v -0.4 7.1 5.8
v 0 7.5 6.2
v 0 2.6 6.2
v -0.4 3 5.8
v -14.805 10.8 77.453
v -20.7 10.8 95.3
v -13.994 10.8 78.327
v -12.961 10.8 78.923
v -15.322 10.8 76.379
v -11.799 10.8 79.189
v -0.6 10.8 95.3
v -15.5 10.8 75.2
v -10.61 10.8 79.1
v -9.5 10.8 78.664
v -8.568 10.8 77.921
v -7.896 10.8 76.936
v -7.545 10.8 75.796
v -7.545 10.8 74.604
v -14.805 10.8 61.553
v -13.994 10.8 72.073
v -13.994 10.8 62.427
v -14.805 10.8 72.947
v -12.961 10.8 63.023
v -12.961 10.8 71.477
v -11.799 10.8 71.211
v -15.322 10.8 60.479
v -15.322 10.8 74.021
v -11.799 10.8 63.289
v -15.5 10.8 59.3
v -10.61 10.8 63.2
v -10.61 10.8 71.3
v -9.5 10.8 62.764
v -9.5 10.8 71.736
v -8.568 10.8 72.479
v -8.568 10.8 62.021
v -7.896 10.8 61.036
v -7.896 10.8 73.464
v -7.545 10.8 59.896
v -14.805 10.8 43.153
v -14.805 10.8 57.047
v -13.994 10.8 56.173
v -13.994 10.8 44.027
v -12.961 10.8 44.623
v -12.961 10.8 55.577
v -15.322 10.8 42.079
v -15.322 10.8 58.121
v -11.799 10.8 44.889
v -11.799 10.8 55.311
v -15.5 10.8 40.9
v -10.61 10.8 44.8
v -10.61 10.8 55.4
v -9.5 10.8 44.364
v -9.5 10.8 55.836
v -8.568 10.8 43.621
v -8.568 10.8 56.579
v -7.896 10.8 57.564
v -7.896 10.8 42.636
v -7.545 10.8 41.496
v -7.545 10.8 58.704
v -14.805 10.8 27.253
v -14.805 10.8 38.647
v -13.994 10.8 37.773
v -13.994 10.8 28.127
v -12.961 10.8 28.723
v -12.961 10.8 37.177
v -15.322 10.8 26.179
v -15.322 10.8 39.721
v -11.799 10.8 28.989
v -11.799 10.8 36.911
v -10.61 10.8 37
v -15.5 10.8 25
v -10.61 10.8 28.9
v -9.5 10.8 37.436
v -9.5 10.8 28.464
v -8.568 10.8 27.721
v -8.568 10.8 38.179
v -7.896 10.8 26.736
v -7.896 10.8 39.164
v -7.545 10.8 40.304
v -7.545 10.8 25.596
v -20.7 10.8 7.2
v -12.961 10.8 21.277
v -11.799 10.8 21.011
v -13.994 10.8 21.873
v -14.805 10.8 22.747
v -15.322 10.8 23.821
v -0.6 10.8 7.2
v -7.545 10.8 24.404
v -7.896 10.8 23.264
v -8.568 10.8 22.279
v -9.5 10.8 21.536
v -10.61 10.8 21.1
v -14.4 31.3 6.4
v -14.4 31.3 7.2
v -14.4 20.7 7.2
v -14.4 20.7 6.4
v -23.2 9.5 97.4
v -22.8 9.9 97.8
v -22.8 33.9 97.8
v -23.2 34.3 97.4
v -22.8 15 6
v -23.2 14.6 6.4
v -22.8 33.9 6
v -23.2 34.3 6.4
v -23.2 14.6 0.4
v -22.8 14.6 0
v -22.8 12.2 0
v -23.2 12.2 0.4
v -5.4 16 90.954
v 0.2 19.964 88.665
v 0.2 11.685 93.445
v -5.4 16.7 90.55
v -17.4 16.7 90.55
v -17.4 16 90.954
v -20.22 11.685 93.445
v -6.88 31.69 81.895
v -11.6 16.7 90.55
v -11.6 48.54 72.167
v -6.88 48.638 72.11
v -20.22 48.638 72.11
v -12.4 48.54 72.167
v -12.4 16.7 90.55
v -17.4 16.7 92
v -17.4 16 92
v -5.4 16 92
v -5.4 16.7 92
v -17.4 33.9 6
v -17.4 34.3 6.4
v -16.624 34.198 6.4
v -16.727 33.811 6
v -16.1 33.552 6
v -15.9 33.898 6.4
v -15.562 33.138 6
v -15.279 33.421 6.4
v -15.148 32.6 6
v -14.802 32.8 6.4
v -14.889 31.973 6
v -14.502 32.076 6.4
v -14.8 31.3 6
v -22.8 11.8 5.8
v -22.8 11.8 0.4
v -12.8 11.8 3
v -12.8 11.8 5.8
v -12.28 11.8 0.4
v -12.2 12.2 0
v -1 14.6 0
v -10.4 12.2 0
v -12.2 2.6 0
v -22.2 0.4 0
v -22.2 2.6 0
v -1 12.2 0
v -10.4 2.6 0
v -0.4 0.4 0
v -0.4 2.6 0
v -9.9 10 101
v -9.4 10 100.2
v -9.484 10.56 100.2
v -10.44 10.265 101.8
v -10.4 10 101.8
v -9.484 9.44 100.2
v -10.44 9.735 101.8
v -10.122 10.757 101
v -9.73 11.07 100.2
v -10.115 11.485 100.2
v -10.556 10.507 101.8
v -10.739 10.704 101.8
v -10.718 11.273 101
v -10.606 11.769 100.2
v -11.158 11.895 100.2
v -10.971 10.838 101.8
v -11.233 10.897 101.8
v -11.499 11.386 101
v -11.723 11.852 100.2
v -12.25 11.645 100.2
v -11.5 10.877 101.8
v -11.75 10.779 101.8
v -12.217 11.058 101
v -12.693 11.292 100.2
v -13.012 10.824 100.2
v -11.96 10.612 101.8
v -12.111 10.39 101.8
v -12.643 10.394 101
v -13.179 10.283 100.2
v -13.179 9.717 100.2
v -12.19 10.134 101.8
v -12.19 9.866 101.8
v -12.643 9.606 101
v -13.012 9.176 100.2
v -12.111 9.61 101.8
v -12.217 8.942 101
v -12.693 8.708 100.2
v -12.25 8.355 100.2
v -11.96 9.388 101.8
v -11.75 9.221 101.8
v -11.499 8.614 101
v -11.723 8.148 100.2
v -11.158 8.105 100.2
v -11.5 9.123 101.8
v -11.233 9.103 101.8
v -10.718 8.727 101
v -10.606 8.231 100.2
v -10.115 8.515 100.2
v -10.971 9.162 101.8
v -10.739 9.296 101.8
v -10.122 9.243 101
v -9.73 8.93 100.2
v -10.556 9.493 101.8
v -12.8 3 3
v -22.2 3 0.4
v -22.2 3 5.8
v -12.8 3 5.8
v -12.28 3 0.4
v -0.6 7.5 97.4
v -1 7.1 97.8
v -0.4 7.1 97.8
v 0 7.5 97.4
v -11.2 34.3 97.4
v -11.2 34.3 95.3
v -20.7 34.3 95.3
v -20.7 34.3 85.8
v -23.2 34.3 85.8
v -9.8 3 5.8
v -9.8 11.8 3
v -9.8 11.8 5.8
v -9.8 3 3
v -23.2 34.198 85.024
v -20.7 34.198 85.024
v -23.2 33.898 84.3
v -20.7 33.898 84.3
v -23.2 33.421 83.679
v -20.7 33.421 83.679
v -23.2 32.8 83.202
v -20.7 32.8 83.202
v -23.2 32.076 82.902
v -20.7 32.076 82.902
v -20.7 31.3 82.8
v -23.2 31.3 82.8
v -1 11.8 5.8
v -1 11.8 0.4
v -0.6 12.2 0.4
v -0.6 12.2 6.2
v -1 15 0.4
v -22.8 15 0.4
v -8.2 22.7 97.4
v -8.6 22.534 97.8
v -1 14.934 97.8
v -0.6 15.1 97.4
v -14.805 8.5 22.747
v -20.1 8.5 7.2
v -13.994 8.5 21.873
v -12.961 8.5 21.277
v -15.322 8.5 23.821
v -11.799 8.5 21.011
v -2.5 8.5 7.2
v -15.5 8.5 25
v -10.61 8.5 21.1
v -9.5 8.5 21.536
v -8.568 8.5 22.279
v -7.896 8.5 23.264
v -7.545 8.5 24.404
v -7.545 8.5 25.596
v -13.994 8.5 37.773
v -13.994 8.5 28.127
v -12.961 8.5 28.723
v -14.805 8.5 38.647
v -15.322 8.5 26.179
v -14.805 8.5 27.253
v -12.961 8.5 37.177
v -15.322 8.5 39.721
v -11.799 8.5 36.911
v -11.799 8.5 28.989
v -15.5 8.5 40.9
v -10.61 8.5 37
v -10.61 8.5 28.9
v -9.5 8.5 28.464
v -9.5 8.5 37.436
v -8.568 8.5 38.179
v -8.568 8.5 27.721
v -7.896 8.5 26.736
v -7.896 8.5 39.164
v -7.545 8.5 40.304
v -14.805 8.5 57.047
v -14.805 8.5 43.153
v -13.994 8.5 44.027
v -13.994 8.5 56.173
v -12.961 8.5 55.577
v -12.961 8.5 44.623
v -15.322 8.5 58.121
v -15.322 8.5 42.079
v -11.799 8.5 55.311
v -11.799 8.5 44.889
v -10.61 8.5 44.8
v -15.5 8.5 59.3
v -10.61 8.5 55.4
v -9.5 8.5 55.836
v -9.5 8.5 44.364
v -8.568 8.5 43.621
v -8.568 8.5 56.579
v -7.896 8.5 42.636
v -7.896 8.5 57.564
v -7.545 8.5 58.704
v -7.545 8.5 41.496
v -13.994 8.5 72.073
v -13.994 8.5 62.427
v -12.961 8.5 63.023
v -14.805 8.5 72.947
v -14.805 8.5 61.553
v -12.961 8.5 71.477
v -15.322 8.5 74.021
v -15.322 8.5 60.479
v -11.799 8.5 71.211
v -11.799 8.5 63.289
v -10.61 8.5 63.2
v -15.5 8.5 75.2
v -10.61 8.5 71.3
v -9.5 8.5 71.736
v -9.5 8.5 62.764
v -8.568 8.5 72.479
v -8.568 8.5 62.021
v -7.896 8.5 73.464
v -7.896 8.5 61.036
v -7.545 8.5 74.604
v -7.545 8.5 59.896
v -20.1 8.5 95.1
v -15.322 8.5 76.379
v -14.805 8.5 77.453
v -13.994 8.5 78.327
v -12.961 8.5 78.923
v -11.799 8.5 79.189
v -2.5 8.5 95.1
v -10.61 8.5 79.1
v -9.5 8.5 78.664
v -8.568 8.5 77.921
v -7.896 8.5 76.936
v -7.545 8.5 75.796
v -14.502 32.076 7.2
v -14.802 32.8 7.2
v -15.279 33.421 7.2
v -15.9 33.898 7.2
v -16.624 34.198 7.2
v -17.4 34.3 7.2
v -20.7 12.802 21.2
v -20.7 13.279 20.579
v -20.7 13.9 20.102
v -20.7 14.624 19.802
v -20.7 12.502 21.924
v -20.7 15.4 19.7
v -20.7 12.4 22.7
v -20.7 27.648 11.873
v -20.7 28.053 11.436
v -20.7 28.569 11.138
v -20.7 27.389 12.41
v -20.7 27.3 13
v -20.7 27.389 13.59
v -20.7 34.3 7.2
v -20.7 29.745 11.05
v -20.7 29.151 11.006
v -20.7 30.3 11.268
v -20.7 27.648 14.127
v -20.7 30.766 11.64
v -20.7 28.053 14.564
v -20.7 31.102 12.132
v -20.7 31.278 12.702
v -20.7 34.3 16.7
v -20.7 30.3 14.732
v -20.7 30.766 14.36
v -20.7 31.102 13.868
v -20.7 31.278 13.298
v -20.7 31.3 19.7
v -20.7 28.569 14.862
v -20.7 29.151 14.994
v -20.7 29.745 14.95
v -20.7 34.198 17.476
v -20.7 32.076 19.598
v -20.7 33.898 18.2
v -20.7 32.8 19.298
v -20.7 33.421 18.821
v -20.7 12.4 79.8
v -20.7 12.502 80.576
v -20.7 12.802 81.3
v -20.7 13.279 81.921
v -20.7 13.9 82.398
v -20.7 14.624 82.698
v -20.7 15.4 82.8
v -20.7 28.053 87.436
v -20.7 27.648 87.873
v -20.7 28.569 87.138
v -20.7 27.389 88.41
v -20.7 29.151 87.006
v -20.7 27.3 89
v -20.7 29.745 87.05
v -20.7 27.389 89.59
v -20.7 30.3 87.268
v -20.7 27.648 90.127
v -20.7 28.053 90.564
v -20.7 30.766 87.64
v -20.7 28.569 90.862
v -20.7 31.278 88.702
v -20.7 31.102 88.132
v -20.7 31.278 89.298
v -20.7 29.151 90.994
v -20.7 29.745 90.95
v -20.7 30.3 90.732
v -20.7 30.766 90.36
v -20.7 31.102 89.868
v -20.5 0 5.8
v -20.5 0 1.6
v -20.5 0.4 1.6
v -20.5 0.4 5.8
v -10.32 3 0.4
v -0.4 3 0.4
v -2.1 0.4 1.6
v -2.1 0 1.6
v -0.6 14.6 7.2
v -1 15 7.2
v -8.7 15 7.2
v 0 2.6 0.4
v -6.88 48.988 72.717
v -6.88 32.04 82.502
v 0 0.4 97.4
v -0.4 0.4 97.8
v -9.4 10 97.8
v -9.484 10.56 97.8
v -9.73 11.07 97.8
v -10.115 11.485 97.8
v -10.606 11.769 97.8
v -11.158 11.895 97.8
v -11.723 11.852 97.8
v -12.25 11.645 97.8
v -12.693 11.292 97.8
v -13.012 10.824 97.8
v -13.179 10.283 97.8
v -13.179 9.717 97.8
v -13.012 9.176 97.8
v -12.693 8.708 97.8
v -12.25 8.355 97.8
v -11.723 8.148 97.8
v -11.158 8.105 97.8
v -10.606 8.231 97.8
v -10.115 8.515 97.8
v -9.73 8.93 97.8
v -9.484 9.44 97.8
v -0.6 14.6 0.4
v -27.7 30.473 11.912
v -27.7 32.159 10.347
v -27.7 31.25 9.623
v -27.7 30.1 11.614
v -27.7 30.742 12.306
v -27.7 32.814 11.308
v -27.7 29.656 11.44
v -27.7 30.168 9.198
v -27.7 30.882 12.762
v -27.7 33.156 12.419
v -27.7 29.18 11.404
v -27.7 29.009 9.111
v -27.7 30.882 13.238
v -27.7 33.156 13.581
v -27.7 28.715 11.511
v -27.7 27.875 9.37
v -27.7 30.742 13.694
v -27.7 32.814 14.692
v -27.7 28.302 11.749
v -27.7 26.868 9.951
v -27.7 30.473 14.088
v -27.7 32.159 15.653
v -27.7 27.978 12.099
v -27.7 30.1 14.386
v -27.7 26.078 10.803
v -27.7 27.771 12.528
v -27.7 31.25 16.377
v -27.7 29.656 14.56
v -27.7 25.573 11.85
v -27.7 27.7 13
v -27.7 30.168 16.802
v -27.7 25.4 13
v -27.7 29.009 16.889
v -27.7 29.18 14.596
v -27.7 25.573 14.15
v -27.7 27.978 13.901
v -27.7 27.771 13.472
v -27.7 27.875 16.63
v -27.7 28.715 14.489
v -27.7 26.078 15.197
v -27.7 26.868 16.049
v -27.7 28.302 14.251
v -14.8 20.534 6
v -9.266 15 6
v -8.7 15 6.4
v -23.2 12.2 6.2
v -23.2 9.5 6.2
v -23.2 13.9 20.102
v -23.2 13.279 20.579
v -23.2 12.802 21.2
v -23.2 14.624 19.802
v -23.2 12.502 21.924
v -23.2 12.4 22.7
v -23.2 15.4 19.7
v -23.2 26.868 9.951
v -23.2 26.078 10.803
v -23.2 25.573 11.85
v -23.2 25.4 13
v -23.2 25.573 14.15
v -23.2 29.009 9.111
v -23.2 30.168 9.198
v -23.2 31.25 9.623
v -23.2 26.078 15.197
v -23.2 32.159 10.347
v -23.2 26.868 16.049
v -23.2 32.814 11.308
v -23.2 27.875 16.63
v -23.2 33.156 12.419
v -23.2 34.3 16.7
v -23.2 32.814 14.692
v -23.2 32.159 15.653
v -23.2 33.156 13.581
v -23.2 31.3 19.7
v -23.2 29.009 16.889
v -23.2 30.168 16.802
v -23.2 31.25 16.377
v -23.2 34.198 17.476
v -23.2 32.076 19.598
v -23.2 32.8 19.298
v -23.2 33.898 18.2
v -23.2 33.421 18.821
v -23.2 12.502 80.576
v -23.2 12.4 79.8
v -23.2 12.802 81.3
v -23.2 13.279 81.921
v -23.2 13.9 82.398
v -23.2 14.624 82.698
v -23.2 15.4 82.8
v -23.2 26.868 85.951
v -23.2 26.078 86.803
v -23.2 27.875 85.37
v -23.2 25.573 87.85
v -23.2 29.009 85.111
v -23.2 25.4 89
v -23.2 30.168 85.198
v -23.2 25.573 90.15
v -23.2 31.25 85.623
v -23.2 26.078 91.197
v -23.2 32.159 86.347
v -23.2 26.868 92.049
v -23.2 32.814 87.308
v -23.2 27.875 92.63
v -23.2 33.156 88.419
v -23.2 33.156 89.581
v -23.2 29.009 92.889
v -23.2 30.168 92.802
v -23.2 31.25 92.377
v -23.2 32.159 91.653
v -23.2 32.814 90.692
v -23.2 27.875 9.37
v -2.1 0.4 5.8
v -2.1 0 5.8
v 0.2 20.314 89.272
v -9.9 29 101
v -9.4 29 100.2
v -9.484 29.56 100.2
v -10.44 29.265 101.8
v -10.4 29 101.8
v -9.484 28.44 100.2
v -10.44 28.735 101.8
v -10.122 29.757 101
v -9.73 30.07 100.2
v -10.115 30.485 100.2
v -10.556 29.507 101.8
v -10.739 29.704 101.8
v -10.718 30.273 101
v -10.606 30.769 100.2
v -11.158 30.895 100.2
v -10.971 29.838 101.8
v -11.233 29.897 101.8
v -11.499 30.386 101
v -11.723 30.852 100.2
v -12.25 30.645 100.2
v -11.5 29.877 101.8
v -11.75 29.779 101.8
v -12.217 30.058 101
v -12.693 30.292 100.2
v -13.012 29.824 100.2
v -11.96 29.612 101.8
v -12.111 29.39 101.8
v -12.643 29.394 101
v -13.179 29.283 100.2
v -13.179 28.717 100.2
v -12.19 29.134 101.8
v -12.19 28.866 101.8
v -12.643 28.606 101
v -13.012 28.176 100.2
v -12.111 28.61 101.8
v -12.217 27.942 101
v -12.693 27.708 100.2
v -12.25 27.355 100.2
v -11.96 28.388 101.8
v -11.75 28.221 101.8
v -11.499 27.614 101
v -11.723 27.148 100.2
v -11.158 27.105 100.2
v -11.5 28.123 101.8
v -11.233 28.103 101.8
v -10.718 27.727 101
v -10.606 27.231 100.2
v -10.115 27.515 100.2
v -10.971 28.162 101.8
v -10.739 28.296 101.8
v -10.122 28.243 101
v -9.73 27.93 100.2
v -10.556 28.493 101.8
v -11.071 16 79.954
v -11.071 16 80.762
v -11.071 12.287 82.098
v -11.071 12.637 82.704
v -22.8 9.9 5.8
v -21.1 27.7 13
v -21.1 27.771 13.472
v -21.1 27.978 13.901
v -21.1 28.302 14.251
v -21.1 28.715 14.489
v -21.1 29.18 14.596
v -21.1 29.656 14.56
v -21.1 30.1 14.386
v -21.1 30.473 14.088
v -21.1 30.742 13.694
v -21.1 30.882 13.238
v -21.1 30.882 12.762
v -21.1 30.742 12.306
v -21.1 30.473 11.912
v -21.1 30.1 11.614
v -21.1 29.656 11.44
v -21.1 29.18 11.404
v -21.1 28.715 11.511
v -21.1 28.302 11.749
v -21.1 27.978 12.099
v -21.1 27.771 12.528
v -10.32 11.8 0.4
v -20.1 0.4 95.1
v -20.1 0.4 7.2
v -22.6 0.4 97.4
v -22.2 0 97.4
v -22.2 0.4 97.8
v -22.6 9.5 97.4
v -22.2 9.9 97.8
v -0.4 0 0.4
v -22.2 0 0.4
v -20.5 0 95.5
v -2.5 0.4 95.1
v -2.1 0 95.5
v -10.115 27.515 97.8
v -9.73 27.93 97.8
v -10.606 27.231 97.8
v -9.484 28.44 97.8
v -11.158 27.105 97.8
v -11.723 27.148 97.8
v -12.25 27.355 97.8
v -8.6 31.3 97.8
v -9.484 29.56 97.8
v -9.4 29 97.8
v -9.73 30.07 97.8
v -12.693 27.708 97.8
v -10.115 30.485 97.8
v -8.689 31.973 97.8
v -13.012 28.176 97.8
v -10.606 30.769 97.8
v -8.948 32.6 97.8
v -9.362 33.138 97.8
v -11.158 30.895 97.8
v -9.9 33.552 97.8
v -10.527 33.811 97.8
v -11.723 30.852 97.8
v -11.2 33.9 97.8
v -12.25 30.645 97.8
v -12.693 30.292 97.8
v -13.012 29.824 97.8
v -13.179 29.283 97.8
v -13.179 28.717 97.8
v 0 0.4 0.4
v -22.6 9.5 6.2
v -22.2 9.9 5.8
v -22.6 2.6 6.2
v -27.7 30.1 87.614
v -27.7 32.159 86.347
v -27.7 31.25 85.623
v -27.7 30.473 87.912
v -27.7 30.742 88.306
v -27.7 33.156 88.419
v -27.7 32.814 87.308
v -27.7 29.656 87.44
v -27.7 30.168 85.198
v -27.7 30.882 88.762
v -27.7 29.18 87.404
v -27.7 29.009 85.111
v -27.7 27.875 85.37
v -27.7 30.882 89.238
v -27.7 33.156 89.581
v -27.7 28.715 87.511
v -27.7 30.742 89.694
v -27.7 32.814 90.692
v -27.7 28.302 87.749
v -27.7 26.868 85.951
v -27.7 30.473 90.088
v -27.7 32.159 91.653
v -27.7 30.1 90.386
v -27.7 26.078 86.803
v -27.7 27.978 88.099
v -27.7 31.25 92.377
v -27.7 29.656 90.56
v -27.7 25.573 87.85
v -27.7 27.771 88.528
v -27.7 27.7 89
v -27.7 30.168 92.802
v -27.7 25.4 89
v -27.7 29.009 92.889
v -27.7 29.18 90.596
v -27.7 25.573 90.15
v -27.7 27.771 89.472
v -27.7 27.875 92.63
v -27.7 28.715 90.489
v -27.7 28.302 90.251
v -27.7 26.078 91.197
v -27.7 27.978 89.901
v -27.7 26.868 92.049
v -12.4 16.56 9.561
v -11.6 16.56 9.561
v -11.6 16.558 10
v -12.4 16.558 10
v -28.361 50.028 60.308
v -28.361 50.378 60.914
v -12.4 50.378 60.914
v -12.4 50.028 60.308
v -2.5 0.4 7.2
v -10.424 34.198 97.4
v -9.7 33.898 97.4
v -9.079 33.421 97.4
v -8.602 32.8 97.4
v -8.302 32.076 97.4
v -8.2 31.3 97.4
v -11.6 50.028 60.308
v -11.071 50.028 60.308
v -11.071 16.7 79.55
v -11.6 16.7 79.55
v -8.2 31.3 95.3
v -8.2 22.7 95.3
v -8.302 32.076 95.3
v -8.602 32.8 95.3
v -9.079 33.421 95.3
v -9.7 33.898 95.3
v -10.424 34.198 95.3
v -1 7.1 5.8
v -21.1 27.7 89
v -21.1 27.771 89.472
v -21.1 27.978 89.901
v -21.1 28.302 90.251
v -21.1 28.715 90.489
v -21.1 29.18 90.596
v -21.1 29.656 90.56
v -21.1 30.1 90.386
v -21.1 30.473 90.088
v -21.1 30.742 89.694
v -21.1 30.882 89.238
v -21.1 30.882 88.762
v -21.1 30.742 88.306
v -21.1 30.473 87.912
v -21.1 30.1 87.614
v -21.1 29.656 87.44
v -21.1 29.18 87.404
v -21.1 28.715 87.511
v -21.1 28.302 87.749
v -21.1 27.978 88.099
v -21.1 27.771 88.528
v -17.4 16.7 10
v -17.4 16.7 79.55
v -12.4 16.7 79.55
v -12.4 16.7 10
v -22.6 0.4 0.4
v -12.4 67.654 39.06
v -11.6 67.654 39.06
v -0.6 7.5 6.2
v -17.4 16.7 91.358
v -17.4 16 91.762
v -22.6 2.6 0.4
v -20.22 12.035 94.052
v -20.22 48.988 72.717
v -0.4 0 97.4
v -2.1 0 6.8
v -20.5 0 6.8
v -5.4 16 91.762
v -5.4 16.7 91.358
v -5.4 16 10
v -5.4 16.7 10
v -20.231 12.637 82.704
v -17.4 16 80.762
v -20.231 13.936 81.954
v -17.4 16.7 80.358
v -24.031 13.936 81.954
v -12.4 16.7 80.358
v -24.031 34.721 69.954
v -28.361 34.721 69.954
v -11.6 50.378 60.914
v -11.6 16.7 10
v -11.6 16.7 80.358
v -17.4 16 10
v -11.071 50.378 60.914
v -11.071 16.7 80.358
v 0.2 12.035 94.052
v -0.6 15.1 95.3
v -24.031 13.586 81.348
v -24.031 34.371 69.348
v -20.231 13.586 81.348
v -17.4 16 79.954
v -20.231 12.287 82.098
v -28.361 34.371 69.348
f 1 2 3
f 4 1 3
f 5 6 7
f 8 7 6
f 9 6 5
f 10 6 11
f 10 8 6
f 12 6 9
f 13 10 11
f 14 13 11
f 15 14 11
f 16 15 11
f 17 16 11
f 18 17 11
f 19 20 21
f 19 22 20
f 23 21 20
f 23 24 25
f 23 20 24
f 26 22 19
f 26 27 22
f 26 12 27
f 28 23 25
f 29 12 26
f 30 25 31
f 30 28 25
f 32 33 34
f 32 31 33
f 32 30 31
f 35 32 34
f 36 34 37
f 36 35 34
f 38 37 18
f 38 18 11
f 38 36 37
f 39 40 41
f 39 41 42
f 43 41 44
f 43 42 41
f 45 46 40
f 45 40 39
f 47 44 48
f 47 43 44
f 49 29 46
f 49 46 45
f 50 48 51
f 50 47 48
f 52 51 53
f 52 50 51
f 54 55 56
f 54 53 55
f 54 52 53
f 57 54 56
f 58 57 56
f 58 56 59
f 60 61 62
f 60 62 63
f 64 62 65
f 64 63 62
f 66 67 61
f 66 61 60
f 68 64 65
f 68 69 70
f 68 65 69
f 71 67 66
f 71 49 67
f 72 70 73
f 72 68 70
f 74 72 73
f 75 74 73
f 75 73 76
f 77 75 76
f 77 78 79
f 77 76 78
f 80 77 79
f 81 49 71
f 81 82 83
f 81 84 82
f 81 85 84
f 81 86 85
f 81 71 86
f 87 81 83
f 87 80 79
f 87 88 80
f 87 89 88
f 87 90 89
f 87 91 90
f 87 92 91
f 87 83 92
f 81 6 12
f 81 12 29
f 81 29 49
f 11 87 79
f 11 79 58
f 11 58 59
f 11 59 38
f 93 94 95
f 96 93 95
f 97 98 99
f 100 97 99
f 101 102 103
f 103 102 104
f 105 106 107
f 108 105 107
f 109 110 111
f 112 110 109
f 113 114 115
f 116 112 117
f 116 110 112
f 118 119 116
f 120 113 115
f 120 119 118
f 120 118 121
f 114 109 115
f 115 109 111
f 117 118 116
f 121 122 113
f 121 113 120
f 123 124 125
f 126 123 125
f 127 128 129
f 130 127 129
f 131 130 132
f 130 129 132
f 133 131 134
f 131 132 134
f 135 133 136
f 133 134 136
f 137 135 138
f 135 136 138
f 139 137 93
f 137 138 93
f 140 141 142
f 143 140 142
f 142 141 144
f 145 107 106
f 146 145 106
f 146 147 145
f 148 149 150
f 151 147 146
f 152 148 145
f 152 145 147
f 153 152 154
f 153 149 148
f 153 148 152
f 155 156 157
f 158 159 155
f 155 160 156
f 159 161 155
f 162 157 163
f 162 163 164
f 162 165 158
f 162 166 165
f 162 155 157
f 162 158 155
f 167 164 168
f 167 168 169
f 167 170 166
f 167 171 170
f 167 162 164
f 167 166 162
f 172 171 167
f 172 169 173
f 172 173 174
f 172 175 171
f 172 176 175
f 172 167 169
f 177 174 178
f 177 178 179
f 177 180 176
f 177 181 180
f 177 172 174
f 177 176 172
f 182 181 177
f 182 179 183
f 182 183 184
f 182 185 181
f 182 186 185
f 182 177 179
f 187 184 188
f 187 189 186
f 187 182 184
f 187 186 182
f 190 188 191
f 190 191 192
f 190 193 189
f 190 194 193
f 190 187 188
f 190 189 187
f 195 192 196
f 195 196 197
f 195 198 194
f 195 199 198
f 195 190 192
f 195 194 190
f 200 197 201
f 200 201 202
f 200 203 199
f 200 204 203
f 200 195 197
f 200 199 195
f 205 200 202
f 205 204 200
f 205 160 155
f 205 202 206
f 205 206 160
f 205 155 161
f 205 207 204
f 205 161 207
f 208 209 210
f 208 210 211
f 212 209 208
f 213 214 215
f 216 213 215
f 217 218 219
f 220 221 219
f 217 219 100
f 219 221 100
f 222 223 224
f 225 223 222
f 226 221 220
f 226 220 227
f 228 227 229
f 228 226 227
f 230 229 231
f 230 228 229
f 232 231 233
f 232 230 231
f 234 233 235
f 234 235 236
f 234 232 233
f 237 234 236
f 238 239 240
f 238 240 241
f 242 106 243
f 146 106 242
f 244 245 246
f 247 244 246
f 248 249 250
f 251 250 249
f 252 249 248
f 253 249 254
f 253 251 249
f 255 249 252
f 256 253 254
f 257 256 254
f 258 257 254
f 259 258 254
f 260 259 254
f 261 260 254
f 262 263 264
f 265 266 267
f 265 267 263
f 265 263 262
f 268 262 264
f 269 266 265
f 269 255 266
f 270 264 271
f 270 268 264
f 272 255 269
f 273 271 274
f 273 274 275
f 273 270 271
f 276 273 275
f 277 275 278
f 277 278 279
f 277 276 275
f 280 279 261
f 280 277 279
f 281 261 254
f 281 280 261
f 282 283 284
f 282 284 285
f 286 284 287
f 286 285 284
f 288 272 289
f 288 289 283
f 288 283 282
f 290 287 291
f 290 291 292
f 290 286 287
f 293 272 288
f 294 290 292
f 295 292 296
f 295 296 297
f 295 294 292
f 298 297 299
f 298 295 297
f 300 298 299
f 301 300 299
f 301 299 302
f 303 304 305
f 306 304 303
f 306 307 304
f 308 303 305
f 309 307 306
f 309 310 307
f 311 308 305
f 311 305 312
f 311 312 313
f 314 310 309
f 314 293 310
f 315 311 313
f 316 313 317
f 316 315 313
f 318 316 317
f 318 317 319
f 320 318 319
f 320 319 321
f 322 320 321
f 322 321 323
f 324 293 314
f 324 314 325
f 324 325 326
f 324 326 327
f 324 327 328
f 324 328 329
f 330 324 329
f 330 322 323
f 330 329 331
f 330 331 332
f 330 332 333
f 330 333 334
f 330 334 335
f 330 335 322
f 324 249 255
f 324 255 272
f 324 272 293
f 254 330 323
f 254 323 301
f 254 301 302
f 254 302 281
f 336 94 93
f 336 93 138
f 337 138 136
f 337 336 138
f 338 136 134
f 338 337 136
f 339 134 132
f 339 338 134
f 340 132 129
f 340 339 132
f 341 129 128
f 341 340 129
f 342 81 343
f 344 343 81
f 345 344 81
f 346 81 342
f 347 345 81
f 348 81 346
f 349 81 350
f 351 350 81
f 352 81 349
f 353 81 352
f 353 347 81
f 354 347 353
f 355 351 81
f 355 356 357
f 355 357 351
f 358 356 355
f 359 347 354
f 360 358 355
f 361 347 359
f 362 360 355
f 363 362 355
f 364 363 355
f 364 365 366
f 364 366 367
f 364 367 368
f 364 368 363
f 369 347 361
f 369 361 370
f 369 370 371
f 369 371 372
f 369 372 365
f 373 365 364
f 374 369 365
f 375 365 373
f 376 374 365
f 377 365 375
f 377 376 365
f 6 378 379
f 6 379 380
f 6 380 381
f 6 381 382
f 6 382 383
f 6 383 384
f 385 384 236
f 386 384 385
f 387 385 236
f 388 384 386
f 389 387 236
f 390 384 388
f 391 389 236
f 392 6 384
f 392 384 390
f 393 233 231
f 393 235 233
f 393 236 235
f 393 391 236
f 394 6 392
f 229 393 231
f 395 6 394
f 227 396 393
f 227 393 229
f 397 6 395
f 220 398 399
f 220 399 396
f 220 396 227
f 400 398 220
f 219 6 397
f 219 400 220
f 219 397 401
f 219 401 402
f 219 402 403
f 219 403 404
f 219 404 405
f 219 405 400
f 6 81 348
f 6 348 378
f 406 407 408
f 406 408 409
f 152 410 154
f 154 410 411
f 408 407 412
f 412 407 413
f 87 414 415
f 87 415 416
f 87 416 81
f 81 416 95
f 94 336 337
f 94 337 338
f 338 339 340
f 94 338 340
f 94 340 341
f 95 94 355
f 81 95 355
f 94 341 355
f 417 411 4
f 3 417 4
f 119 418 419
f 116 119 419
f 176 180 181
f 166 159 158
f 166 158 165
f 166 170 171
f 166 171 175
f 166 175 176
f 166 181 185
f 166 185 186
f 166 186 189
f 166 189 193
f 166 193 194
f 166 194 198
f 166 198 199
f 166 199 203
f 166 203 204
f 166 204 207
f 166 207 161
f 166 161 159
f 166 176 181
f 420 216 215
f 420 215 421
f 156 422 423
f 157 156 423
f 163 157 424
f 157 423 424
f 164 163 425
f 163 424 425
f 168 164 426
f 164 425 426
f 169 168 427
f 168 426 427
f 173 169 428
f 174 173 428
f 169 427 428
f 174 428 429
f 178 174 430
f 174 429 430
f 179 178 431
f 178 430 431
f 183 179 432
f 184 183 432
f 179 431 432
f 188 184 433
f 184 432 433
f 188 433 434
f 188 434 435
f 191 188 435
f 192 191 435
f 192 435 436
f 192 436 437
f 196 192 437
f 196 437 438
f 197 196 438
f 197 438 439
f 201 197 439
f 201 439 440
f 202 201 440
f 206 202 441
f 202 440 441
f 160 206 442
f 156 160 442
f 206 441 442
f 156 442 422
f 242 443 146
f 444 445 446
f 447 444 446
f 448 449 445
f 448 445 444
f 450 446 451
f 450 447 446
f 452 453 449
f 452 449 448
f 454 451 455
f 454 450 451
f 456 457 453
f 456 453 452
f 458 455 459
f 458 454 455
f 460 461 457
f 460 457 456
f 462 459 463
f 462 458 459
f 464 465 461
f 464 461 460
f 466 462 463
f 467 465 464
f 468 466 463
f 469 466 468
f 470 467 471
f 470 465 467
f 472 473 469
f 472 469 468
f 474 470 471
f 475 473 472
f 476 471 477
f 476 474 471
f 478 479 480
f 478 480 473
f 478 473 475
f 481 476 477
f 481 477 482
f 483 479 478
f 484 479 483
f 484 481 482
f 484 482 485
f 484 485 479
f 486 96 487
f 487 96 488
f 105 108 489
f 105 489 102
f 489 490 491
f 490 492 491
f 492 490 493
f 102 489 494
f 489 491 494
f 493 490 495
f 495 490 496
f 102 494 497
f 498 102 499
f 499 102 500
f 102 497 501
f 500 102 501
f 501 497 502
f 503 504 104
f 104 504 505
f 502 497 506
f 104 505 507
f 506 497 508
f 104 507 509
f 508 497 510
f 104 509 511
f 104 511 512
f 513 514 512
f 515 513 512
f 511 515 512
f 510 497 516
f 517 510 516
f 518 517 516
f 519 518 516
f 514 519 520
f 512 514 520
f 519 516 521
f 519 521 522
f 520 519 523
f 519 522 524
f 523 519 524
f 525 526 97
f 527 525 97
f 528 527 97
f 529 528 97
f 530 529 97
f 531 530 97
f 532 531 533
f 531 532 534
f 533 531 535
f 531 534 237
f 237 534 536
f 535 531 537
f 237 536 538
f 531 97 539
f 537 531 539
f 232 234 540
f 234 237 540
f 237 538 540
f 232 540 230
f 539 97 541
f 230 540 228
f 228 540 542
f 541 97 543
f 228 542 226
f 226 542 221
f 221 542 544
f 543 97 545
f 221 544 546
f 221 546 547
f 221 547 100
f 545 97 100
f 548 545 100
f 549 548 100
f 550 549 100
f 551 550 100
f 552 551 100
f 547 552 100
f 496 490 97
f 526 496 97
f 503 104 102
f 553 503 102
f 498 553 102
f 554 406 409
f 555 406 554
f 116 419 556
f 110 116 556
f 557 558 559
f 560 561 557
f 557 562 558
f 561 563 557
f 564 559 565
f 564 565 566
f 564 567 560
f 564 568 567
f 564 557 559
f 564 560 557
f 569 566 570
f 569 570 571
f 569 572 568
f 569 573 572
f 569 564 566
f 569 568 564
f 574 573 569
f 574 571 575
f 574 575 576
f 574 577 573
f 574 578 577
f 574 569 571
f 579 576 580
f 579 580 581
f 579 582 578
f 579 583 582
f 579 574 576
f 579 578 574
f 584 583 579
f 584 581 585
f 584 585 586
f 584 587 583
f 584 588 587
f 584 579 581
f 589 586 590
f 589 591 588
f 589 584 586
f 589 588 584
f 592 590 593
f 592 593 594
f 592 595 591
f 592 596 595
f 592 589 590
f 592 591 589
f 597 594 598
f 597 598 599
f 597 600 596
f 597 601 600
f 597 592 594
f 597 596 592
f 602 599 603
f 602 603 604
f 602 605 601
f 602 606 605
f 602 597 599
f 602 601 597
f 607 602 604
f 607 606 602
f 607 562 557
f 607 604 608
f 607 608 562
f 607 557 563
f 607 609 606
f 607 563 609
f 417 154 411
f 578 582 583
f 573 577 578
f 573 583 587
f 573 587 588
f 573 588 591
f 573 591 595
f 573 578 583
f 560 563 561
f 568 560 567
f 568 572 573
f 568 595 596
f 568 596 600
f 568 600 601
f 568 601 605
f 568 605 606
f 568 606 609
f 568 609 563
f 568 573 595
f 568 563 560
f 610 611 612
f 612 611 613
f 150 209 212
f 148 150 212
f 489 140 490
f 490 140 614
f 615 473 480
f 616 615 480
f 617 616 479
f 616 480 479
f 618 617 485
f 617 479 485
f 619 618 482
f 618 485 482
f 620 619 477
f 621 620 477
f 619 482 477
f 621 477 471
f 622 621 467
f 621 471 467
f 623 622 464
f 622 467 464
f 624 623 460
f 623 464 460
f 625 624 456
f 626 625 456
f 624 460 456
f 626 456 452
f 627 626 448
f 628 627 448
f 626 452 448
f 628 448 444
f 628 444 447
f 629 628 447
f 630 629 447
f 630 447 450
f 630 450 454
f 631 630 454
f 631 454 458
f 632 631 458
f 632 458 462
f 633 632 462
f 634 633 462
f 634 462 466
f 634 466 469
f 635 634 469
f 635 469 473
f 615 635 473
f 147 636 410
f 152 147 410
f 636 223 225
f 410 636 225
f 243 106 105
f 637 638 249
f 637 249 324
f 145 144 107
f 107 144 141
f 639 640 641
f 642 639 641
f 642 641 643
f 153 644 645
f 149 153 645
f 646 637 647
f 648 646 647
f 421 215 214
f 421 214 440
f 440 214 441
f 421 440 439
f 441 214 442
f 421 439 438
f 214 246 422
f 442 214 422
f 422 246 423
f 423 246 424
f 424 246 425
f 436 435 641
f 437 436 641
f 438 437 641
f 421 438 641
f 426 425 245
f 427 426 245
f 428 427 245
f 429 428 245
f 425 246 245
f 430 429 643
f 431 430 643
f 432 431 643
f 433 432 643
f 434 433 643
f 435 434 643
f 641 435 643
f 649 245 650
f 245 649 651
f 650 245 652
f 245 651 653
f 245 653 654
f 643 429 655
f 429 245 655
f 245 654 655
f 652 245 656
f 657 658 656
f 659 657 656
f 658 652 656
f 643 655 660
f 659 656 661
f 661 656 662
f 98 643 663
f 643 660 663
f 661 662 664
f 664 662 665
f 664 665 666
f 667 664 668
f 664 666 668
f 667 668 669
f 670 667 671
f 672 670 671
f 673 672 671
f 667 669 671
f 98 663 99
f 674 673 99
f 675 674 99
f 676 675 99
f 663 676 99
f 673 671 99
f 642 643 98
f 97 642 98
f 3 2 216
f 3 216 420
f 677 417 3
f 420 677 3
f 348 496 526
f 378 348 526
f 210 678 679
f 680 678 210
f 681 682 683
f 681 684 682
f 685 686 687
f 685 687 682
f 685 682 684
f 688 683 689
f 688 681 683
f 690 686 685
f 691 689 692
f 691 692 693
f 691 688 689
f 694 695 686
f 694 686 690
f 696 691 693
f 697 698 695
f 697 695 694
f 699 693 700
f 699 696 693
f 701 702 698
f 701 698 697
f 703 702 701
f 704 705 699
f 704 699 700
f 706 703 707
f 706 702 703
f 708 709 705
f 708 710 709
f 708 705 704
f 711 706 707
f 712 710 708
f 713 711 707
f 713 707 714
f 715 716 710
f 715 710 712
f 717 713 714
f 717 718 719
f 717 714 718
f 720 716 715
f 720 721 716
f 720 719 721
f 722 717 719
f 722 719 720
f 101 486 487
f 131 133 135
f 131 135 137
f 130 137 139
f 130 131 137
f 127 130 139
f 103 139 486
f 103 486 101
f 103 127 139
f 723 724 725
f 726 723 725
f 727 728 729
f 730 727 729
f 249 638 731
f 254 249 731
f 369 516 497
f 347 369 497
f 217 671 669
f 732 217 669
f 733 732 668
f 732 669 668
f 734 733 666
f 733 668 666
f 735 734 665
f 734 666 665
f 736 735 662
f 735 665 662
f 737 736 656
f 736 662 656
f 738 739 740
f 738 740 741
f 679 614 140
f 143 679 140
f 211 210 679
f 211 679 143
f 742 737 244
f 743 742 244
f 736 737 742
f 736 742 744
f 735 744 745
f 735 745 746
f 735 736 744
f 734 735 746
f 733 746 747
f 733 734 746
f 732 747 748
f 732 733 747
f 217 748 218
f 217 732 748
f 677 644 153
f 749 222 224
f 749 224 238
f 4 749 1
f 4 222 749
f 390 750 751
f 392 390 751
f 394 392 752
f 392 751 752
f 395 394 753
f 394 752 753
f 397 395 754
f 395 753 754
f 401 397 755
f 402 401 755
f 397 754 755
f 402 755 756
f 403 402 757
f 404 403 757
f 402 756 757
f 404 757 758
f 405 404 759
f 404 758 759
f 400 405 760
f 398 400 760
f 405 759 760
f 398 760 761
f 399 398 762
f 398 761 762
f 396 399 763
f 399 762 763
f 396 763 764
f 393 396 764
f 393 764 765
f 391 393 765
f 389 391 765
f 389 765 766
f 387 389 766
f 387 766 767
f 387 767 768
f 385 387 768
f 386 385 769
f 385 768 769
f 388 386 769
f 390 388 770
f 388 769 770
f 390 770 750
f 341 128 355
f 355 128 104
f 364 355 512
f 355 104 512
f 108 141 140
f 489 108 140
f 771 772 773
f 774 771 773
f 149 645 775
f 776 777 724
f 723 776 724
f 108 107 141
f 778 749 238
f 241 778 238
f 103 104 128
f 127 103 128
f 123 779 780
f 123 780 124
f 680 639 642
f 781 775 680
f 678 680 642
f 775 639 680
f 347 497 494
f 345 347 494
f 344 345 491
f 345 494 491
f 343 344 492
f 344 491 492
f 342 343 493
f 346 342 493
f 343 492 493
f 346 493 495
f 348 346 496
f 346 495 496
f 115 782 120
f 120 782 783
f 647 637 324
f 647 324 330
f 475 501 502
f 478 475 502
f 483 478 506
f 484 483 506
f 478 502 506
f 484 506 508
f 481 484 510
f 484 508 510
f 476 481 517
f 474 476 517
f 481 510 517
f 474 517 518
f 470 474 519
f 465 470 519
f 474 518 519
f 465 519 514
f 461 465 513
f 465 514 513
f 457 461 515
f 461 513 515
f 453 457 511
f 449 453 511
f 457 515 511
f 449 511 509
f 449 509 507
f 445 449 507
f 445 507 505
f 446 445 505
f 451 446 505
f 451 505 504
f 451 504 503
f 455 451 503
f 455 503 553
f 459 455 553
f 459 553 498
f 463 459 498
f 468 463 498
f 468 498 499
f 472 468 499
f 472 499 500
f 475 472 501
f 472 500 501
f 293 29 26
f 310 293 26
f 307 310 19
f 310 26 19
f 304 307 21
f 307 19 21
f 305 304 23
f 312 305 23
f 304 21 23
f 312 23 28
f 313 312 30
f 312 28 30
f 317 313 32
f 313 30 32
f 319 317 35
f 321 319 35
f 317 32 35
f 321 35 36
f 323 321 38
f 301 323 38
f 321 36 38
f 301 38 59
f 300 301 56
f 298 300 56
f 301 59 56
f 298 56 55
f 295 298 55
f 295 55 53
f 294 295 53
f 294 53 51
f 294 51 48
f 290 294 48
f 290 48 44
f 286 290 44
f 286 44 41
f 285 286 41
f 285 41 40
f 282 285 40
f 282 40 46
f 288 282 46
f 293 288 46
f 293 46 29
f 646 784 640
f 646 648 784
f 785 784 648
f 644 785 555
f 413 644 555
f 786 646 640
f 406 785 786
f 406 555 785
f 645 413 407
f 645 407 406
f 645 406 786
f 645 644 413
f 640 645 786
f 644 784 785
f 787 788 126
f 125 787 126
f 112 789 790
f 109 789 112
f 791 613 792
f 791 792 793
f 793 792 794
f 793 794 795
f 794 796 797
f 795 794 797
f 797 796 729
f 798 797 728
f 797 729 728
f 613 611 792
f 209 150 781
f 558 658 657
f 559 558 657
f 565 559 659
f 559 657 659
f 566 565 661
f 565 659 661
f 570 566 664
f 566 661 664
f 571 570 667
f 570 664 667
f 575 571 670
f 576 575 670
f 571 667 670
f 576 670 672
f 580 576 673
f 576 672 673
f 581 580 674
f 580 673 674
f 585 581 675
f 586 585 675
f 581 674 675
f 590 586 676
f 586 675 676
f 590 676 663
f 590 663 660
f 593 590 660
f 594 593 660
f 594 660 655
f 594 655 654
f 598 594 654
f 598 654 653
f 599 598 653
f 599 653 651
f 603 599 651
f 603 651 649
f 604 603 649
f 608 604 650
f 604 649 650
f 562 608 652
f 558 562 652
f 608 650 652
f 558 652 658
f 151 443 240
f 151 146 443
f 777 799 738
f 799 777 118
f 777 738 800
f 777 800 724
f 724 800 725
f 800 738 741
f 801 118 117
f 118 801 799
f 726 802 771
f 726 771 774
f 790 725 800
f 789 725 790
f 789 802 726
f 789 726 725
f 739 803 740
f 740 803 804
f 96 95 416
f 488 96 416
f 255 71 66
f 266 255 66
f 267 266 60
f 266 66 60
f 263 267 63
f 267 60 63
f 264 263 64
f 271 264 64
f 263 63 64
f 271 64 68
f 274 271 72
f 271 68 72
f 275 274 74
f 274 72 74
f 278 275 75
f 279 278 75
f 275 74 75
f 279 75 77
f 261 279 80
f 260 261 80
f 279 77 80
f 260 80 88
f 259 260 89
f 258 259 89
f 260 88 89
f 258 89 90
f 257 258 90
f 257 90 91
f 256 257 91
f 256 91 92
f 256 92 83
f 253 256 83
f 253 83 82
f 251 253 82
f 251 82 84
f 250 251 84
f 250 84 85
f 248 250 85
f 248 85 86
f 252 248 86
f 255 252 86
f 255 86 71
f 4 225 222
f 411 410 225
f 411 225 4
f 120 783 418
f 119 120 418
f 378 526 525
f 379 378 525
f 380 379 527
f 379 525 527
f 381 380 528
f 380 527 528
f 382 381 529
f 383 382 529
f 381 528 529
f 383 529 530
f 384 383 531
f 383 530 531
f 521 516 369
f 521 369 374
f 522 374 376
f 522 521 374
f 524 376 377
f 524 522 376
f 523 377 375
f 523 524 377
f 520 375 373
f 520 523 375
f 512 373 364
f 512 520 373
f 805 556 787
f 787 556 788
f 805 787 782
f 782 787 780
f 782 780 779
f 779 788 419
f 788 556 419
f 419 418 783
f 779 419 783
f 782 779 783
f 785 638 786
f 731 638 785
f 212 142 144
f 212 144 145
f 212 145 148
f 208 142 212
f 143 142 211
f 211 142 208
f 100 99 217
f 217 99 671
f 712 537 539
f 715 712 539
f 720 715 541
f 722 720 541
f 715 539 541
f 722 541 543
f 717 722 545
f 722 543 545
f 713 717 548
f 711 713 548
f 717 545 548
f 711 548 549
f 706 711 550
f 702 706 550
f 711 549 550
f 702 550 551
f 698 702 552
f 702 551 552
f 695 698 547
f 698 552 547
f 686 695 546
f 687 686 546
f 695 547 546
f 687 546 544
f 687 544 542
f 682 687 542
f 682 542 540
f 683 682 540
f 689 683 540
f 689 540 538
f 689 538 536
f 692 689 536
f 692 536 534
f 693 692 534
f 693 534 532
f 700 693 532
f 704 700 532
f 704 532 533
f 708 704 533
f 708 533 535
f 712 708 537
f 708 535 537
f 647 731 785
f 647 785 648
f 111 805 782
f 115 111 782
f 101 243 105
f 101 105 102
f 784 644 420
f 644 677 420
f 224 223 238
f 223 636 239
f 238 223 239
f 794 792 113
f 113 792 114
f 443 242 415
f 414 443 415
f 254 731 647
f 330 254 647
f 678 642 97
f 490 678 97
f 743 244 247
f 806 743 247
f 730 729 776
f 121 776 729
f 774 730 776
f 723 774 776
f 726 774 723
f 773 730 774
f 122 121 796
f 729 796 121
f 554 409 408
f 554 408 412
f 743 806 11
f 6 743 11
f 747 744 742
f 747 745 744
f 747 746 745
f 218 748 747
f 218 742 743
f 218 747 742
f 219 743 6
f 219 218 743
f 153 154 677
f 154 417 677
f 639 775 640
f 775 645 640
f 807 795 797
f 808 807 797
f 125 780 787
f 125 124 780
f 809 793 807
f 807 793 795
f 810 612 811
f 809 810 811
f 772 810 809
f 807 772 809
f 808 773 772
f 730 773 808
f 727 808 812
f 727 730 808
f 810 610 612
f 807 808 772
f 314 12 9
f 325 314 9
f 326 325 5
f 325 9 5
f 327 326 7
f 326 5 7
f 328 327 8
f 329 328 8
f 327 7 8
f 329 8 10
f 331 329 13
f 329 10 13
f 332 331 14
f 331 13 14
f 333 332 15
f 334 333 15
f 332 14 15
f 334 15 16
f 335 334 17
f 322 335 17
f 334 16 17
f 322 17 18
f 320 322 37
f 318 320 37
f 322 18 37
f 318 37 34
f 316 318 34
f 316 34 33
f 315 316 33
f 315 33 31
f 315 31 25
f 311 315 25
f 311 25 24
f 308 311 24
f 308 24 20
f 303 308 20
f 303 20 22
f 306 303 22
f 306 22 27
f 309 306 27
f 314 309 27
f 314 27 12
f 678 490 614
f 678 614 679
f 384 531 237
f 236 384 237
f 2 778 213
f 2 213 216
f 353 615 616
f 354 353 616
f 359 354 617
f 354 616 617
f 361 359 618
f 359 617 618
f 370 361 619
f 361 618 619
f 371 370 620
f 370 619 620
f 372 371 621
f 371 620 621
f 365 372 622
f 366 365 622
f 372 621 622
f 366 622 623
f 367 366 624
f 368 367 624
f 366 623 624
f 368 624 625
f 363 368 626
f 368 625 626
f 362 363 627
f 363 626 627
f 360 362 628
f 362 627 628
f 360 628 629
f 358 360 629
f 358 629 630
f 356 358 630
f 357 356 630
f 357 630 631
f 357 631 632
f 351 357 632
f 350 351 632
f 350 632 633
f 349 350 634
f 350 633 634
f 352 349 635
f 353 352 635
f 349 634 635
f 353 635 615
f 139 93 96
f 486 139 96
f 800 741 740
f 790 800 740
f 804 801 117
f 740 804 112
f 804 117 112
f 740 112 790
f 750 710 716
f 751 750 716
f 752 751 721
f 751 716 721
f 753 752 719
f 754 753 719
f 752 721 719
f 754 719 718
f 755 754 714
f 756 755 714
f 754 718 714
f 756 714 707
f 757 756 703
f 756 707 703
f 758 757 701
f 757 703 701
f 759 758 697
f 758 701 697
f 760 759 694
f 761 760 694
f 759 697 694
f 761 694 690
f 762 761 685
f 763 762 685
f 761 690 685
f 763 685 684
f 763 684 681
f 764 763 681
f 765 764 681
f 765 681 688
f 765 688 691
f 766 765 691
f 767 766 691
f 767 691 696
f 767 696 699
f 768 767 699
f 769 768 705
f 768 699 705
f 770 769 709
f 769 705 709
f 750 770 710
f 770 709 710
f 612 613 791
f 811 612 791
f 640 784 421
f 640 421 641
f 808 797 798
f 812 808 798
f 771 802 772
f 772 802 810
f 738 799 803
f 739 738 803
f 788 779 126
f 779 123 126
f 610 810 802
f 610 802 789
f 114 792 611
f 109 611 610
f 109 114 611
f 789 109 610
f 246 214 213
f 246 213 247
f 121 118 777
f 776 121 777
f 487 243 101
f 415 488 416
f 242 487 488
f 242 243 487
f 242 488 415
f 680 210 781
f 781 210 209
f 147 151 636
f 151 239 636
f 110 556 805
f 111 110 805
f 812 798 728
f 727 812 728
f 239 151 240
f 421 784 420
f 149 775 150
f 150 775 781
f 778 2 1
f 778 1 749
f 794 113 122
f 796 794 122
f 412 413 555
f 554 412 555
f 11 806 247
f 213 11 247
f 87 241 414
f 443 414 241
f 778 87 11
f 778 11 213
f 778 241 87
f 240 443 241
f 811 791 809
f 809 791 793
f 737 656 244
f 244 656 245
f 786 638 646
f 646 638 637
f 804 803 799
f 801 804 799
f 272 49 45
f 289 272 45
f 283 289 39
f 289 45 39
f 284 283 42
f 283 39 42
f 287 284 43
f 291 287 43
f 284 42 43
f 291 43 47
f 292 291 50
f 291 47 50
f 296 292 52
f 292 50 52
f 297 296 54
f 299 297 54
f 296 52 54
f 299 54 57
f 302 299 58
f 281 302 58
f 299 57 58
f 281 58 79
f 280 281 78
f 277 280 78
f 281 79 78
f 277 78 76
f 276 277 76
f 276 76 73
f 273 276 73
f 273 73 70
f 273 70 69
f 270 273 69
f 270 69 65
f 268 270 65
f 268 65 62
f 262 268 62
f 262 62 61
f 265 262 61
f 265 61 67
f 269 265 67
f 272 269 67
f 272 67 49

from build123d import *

# Parameters (mm, degrees)
PAD_DEPTH          = 97.8
PAD001_DEPTH       = 2.5
SKETCH002_W        = 22.6
SKETCH002_H        = 4.2
PAD002_DEPTH       = 7.2
PAD003_DEPTH       = 1.2
PAD004_DEPTH       = 2.5
SKETCH005_W        = 10.4
SKETCH005_H        = 8.8
SKETCH005_W_2      = 9.8
POCKET_DEPTH       = 5.8
CHAMFER_SIZE2      = 3
CHAMFER_SIZE       = 0.6
CHAMFER001_SIZE2   = 3
CHAMFER001_SIZE    = 0.6
SKETCH006_R        = 3.9
PAD005_DEPTH       = 4.5
SKETCH007_R        = 1.6
POCKET001_DEPTH    = 5
SKETCH008_R        = 1.9
PAD006_DEPTH       = 4
CHAMFER002_1_SIZE2 = 1
CHAMFER002_1_SIZE  = 1.6
CHAMFER002_2_SIZE2 = 1
CHAMFER002_2_SIZE  = 1.6
SKETCH009_W        = 18.4
SKETCH009_H        = 4.2
POCKET002_DEPTH    = 0.4
SKETCH010_W        = 17.6
SKETCH010_H        = 87.9
POCKET003_DEPTH    = 8.5
CHAMFER003_SIZE    = 0.4
CHAMFER004_SIZE    = 0.4
CHAMFER005_SIZE    = 0.4
SKETCH011_R        = 4
POCKET004_DEPTH    = 5
SKETCH012_W        = 12
SKETCH012_H        = 82
PAD007_DEPTH       = 0.7
PAD008_DEPTH       = 0.7
PAD009_DEPTH       = 0.7
PAD010_DEPTH       = 0.4


with BuildPart() as body:
    # Sketch → Pad (new body)
    with BuildSketch(Plane.XY):
        Polygon((-22.6, 0), (-22.6, 9.5), (-23.2, 9.5), (-23.2, 10.8), (-0.6, 10.8), (-0.6, 7.5), (0, 7.5), (0, 0), align=None)
    extrude(amount=PAD_DEPTH)

    # Sketch001 (on Face10 of Pad) → Pad001 (join)
    with BuildSketch(Plane.XY.offset(97.8)):
        with BuildLine():
            Line((-23.2, 10.8), (-23.2, 34.3))
            Line((-23.2, 34.3), (-11.2, 34.3))
            ThreePointArc((-8.2, 31.3), (-9.07868, 33.42132), (-11.2, 34.3))
            Line((-8.2, 31.3), (-8.2, 22.7))
            Line((-8.2, 22.7), (-0.6, 15.1))
            Line((-0.6, 15.1), (-0.6, 10.8))
            Line((-0.6, 10.8), (-23.2, 10.8))
        make_face()
    extrude(amount=-PAD001_DEPTH)

    # Sketch002 (on Face4 of Pad001) → Pad002 (join)
    with BuildSketch(Plane(origin=(0, 0, 0), x_dir=(1, 0, 0), z_dir=(0, 0, -1))):
        with Locations((-11.9, -12.9)):
            Rectangle(SKETCH002_W, SKETCH002_H)
    extrude(amount=-PAD002_DEPTH)

    # Sketch003 (on Face22 of Pad002) → Pad003 (join)
    with BuildSketch(Plane.XY.offset(7.2)):
        with BuildLine():
            Line((-23.2, 15), (-23.2, 34.3))
            Line((-23.2, 34.3), (-17.4, 34.3))
            ThreePointArc((-14.4, 31.3), (-15.27868, 33.42132), (-17.4, 34.3))
            Line((-14.4, 31.3), (-14.4, 20.7))
            Line((-14.4, 20.7), (-8.7, 15))
            Line((-8.7, 15), (-23.2, 15))
        make_face()
    extrude(amount=-PAD003_DEPTH)

    # Sketch004 (on Face7 of Pad003) → Pad004 (join)
    with BuildSketch(Plane(origin=(-23.2, 0, 0), x_dir=(0, -1, 0), z_dir=(-1, 0, 0))):
        with BuildLine():
            Line((-34.3, 7.2), (-34.3, 16.7))
            ThreePointArc((-31.3, 19.7), (-33.42132, 18.82132), (-34.3, 16.7))
            Line((-31.3, 19.7), (-15.4, 19.7))
            ThreePointArc((-15.4, 19.7), (-13.27868, 20.57868), (-12.4, 22.7))
            Line((-12.4, 22.7), (-12.4, 79.8))
            ThreePointArc((-12.4, 79.8), (-13.27868, 81.92132), (-15.4, 82.8))
            Line((-15.4, 82.8), (-31.3, 82.8))
            ThreePointArc((-34.3, 85.8), (-33.42132, 83.67868), (-31.3, 82.8))
            Line((-34.3, 85.8), (-34.3, 95.3))
            Line((-34.3, 95.3), (-10.8, 95.3))
            Line((-10.8, 95.3), (-10.8, 7.2))
            Line((-10.8, 7.2), (-34.3, 7.2))
        make_face()
    extrude(amount=-PAD004_DEPTH)

    # Sketch005 (on Face4 of Pad004) → Pocket (cut)
    with BuildSketch(Plane(origin=(0, 0, 0), x_dir=(1, 0, 0), z_dir=(0, 0, -1))):
        with Locations((-18, -7.4)):
            Rectangle(SKETCH005_W, SKETCH005_H)
        with Locations((-4.9, -7.4)):
            Rectangle(SKETCH005_W_2, SKETCH005_H)
    extrude(amount=-POCKET_DEPTH, mode=Mode.SUBTRACT)

    # Chamfer
    chamfer_edges = [body.edges().sort_by_distance(p)[0] for p in [
        (-9.8, 6.9, 0),
    ]]
    chamfer_side = body.faces().sort_by_distance((-11.3, 2.885526, 0))[0]
    chamfer(chamfer_edges, length=CHAMFER_SIZE, length2=CHAMFER_SIZE2, reference=chamfer_side)

    # Chamfer001
    chamfer001_edges = [body.edges().sort_by_distance(p)[0] for p in [
        (-12.8, 6.9, 0),
    ]]
    chamfer001_side = body.faces().sort_by_distance((-11.36491, 2.668377, 0))[0]
    chamfer(chamfer001_edges, length=CHAMFER001_SIZE, length2=CHAMFER001_SIZE2, reference=chamfer001_side)

    # Sketch006 (on Face25 of Chamfer001) → Pad005 (join)
    with BuildSketch(Plane(origin=(-23.2, 0, 0), x_dir=(0, -1, 0), z_dir=(-1, 0, 0))):
        with Locations((-29.3, 89)):
            Circle(SKETCH006_R)
        with Locations((-29.3, 13)):
            Circle(SKETCH006_R)
    extrude(amount=PAD005_DEPTH)

    # Sketch007 (on Face25 of Pad005) → Pocket001 (cut, symmetric)
    with BuildSketch(Plane(origin=(-23.2, 0, 0), x_dir=(0, -1, 0), z_dir=(-1, 0, 0))):
        with Locations((-29.3, 13)):
            Circle(SKETCH007_R)
        with Locations((-29.3, 89)):
            Circle(SKETCH007_R)
    extrude(amount=POCKET001_DEPTH, both=True, mode=Mode.SUBTRACT)

    # Sketch008 (on Face22 of Pocket001) → Pad006 (join)
    with BuildSketch(Plane.XY.offset(97.8)):
        with Locations((-11.3, 10)):
            Circle(SKETCH008_R)
        with Locations((-11.3, 29)):
            Circle(SKETCH008_R)
    extrude(amount=PAD006_DEPTH)

    # Chamfer002 1
    chamfer002_1_edges = [body.edges().sort_by_distance(p)[0] for p in [
        (-13.2, 29, 101.8),
    ]]
    chamfer002_1_side = body.faces().sort_by_distance((-13.2, 29, 99.8))[0]
    chamfer(chamfer002_1_edges, length=CHAMFER002_1_SIZE, length2=CHAMFER002_1_SIZE2, reference=chamfer002_1_side)

    # Chamfer002 2
    chamfer002_2_edges = [body.edges().sort_by_distance(p)[0] for p in [
        (-13.2, 10, 101.8),
    ]]
    chamfer002_2_side = body.faces().sort_by_distance((-13.2, 10, 99.8))[0]
    chamfer(chamfer002_2_edges, length=CHAMFER002_2_SIZE, length2=CHAMFER002_2_SIZE2, reference=chamfer002_2_side)

    # Sketch009 (on Face12 of Chamfer002) → Pocket002 (cut)
    with BuildSketch(Plane.XZ):
        with Locations((-11.3, 3.7)):
            Rectangle(SKETCH009_W, SKETCH009_H)
    extrude(amount=-POCKET002_DEPTH, mode=Mode.SUBTRACT)

    # Sketch010 (on Face12 of Pocket002) → Pocket003 (cut)
    with BuildSketch(Plane.XZ):
        with Locations((-11.3, 51.15)):
            Rectangle(SKETCH010_W, SKETCH010_H)
    extrude(amount=-POCKET003_DEPTH, mode=Mode.SUBTRACT)

    # Chamfer003
    chamfer003_edges = [body.edges().sort_by_distance(p)[0] for p in [
        (-20.7, 30.9, 13),
        (-20.7, 30.9, 89),
    ]]
    chamfer(chamfer003_edges, length=CHAMFER003_SIZE)

    # Chamfer004
    chamfer004_edges = [body.edges().sort_by_distance(p)[0] for p in [
        (-22.6, 0, 48.9),
        (0, 0, 48.9),
        (-20.1, 0, 51.15),
        (-11.3, 0, 95.1),
        (-2.5, 0, 51.15),
        (-11.3, 0, 7.2),
        (-11.3, 0, 0),
        (0, 1.5, 0),
        (-22.6, 1.5, 0),
        (-17.7, 3, 0),
        (-4.9, 3, 0),
        (-5.2, 11.8, 0),
        (-0.6, 13.4, 0),
        (-0.6, 15, 3.6),
        (-11.9, 15, 0),
        (-18, 11.8, 0),
        (-23.2, 13.4, 0),
        (-23.2, 15, 3),
        (-11.3, 0, 97.8),
        (-22.6, 4.75, 97.8),
        (-22.9, 9.5, 97.8),
        (-23.2, 10.15, 97.8),
        (-23.2, 22.55, 97.8),
        (0, 3.75, 97.8),
        (-0.3, 7.5, 97.8),
        (-0.6, 9.15, 97.8),
        (-0.6, 12.95, 97.8),
        (-4.4, 18.9, 97.8),
        (-8.2, 27, 97.8),
        (0, 3, 2.9),
        (0, 5.25, 5.8),
        (-0.3, 7.5, 5.8),
        (-0.6, 9.15, 5.8),
        (-0.6, 11.3, 5.8),
        (-0.6, 11.8, 2.9),
        (-22.6, 3, 2.9),
        (-22.6, 6.25, 5.8),
        (-22.9, 9.5, 5.8),
        (-23.2, 10.15, 5.8),
        (-23.2, 11.3, 5.8),
        (-23.2, 11.8, 2.9),
    ]]
    chamfer(chamfer004_edges, length=CHAMFER004_SIZE)

    # Chamfer005
    chamfer005_edges = [body.edges().sort_by_distance(p)[0] for p in [
        (-11.55, 17.85, 6),
        (-14.4, 26, 6),
        (-15.27868, 33.42132, 6),
        (-20.3, 34.3, 6),
        (-23.2, 24.65, 6),
    ]]
    chamfer(chamfer005_edges, length=CHAMFER005_SIZE)

    # Sketch011 (on Face22 of Chamfer005) → Pocket004 (cut)
    with BuildSketch(Plane(origin=(0, 10.8, 0), x_dir=(-1, 0, 0), z_dir=(0, 1, 0))):
        with Locations((11.5, 25)):
            Circle(SKETCH011_R)
        with Locations((11.5, 40.9)):
            Circle(SKETCH011_R)
        with Locations((11.5, 59.3)):
            Circle(SKETCH011_R)
        with Locations((11.5, 75.2)):
            Circle(SKETCH011_R)
    extrude(amount=-POCKET004_DEPTH, mode=Mode.SUBTRACT)


with BuildPart() as body001:
    # Sketch012 (on DatumPlane) → Pad007 (new body)
    with BuildSketch(Plane.XZ.offset(-16)):
        with Locations((-11.4, 51)):
            Rectangle(SKETCH012_W, SKETCH012_H)
    extrude(amount=-PAD007_DEPTH)

    # Sketch013 (on DatumPlane) → Pad008 (join)
    with BuildSketch(Plane(origin=(0, 0, 90), x_dir=(1, 0, 0), z_dir=(0, 0.5, 0.866025))):
        Polygon((-28.360654, 58.171814), (-11.070654, 58.171814), (-11.070654, 14.591814), (-20.230654, 14.591814), (-20.230654, 16.091814), (-24.030654, 16.091814), (-24.030654, 40.091814), (-28.360654, 40.091814), align=None)
    extrude(amount=-PAD008_DEPTH)

    # Sketch014 (on DatumPlane) → Pad009 (join)
    with BuildSketch(Plane(origin=(0, 0, 101), x_dir=(1, 0, 0), z_dir=(0, 0.5, 0.866025))):
        Polygon((-20.22, 13.896562), (-20.22, 56.566562), (-6.88, 56.566562), (-6.88, 36.996562), (0.2, 23.456562), (0.2, 13.896562), align=None)
    extrude(amount=-PAD009_DEPTH)

    # Sketch015 (on DatumPlane) → Pad010 (join, symmetric)
    with BuildSketch(Plane(origin=(-12, 0, 0), x_dir=(0, 0.866025, 0.5), z_dir=(1, 0, 0))):
        Polygon((19.12226, 0), (59.52729, 70.702085), (78.120346, 38.418921), (78.120346, 0), align=None)
    extrude(amount=PAD010_DEPTH, both=True)


solid = Compound([body.part, body001.part])
